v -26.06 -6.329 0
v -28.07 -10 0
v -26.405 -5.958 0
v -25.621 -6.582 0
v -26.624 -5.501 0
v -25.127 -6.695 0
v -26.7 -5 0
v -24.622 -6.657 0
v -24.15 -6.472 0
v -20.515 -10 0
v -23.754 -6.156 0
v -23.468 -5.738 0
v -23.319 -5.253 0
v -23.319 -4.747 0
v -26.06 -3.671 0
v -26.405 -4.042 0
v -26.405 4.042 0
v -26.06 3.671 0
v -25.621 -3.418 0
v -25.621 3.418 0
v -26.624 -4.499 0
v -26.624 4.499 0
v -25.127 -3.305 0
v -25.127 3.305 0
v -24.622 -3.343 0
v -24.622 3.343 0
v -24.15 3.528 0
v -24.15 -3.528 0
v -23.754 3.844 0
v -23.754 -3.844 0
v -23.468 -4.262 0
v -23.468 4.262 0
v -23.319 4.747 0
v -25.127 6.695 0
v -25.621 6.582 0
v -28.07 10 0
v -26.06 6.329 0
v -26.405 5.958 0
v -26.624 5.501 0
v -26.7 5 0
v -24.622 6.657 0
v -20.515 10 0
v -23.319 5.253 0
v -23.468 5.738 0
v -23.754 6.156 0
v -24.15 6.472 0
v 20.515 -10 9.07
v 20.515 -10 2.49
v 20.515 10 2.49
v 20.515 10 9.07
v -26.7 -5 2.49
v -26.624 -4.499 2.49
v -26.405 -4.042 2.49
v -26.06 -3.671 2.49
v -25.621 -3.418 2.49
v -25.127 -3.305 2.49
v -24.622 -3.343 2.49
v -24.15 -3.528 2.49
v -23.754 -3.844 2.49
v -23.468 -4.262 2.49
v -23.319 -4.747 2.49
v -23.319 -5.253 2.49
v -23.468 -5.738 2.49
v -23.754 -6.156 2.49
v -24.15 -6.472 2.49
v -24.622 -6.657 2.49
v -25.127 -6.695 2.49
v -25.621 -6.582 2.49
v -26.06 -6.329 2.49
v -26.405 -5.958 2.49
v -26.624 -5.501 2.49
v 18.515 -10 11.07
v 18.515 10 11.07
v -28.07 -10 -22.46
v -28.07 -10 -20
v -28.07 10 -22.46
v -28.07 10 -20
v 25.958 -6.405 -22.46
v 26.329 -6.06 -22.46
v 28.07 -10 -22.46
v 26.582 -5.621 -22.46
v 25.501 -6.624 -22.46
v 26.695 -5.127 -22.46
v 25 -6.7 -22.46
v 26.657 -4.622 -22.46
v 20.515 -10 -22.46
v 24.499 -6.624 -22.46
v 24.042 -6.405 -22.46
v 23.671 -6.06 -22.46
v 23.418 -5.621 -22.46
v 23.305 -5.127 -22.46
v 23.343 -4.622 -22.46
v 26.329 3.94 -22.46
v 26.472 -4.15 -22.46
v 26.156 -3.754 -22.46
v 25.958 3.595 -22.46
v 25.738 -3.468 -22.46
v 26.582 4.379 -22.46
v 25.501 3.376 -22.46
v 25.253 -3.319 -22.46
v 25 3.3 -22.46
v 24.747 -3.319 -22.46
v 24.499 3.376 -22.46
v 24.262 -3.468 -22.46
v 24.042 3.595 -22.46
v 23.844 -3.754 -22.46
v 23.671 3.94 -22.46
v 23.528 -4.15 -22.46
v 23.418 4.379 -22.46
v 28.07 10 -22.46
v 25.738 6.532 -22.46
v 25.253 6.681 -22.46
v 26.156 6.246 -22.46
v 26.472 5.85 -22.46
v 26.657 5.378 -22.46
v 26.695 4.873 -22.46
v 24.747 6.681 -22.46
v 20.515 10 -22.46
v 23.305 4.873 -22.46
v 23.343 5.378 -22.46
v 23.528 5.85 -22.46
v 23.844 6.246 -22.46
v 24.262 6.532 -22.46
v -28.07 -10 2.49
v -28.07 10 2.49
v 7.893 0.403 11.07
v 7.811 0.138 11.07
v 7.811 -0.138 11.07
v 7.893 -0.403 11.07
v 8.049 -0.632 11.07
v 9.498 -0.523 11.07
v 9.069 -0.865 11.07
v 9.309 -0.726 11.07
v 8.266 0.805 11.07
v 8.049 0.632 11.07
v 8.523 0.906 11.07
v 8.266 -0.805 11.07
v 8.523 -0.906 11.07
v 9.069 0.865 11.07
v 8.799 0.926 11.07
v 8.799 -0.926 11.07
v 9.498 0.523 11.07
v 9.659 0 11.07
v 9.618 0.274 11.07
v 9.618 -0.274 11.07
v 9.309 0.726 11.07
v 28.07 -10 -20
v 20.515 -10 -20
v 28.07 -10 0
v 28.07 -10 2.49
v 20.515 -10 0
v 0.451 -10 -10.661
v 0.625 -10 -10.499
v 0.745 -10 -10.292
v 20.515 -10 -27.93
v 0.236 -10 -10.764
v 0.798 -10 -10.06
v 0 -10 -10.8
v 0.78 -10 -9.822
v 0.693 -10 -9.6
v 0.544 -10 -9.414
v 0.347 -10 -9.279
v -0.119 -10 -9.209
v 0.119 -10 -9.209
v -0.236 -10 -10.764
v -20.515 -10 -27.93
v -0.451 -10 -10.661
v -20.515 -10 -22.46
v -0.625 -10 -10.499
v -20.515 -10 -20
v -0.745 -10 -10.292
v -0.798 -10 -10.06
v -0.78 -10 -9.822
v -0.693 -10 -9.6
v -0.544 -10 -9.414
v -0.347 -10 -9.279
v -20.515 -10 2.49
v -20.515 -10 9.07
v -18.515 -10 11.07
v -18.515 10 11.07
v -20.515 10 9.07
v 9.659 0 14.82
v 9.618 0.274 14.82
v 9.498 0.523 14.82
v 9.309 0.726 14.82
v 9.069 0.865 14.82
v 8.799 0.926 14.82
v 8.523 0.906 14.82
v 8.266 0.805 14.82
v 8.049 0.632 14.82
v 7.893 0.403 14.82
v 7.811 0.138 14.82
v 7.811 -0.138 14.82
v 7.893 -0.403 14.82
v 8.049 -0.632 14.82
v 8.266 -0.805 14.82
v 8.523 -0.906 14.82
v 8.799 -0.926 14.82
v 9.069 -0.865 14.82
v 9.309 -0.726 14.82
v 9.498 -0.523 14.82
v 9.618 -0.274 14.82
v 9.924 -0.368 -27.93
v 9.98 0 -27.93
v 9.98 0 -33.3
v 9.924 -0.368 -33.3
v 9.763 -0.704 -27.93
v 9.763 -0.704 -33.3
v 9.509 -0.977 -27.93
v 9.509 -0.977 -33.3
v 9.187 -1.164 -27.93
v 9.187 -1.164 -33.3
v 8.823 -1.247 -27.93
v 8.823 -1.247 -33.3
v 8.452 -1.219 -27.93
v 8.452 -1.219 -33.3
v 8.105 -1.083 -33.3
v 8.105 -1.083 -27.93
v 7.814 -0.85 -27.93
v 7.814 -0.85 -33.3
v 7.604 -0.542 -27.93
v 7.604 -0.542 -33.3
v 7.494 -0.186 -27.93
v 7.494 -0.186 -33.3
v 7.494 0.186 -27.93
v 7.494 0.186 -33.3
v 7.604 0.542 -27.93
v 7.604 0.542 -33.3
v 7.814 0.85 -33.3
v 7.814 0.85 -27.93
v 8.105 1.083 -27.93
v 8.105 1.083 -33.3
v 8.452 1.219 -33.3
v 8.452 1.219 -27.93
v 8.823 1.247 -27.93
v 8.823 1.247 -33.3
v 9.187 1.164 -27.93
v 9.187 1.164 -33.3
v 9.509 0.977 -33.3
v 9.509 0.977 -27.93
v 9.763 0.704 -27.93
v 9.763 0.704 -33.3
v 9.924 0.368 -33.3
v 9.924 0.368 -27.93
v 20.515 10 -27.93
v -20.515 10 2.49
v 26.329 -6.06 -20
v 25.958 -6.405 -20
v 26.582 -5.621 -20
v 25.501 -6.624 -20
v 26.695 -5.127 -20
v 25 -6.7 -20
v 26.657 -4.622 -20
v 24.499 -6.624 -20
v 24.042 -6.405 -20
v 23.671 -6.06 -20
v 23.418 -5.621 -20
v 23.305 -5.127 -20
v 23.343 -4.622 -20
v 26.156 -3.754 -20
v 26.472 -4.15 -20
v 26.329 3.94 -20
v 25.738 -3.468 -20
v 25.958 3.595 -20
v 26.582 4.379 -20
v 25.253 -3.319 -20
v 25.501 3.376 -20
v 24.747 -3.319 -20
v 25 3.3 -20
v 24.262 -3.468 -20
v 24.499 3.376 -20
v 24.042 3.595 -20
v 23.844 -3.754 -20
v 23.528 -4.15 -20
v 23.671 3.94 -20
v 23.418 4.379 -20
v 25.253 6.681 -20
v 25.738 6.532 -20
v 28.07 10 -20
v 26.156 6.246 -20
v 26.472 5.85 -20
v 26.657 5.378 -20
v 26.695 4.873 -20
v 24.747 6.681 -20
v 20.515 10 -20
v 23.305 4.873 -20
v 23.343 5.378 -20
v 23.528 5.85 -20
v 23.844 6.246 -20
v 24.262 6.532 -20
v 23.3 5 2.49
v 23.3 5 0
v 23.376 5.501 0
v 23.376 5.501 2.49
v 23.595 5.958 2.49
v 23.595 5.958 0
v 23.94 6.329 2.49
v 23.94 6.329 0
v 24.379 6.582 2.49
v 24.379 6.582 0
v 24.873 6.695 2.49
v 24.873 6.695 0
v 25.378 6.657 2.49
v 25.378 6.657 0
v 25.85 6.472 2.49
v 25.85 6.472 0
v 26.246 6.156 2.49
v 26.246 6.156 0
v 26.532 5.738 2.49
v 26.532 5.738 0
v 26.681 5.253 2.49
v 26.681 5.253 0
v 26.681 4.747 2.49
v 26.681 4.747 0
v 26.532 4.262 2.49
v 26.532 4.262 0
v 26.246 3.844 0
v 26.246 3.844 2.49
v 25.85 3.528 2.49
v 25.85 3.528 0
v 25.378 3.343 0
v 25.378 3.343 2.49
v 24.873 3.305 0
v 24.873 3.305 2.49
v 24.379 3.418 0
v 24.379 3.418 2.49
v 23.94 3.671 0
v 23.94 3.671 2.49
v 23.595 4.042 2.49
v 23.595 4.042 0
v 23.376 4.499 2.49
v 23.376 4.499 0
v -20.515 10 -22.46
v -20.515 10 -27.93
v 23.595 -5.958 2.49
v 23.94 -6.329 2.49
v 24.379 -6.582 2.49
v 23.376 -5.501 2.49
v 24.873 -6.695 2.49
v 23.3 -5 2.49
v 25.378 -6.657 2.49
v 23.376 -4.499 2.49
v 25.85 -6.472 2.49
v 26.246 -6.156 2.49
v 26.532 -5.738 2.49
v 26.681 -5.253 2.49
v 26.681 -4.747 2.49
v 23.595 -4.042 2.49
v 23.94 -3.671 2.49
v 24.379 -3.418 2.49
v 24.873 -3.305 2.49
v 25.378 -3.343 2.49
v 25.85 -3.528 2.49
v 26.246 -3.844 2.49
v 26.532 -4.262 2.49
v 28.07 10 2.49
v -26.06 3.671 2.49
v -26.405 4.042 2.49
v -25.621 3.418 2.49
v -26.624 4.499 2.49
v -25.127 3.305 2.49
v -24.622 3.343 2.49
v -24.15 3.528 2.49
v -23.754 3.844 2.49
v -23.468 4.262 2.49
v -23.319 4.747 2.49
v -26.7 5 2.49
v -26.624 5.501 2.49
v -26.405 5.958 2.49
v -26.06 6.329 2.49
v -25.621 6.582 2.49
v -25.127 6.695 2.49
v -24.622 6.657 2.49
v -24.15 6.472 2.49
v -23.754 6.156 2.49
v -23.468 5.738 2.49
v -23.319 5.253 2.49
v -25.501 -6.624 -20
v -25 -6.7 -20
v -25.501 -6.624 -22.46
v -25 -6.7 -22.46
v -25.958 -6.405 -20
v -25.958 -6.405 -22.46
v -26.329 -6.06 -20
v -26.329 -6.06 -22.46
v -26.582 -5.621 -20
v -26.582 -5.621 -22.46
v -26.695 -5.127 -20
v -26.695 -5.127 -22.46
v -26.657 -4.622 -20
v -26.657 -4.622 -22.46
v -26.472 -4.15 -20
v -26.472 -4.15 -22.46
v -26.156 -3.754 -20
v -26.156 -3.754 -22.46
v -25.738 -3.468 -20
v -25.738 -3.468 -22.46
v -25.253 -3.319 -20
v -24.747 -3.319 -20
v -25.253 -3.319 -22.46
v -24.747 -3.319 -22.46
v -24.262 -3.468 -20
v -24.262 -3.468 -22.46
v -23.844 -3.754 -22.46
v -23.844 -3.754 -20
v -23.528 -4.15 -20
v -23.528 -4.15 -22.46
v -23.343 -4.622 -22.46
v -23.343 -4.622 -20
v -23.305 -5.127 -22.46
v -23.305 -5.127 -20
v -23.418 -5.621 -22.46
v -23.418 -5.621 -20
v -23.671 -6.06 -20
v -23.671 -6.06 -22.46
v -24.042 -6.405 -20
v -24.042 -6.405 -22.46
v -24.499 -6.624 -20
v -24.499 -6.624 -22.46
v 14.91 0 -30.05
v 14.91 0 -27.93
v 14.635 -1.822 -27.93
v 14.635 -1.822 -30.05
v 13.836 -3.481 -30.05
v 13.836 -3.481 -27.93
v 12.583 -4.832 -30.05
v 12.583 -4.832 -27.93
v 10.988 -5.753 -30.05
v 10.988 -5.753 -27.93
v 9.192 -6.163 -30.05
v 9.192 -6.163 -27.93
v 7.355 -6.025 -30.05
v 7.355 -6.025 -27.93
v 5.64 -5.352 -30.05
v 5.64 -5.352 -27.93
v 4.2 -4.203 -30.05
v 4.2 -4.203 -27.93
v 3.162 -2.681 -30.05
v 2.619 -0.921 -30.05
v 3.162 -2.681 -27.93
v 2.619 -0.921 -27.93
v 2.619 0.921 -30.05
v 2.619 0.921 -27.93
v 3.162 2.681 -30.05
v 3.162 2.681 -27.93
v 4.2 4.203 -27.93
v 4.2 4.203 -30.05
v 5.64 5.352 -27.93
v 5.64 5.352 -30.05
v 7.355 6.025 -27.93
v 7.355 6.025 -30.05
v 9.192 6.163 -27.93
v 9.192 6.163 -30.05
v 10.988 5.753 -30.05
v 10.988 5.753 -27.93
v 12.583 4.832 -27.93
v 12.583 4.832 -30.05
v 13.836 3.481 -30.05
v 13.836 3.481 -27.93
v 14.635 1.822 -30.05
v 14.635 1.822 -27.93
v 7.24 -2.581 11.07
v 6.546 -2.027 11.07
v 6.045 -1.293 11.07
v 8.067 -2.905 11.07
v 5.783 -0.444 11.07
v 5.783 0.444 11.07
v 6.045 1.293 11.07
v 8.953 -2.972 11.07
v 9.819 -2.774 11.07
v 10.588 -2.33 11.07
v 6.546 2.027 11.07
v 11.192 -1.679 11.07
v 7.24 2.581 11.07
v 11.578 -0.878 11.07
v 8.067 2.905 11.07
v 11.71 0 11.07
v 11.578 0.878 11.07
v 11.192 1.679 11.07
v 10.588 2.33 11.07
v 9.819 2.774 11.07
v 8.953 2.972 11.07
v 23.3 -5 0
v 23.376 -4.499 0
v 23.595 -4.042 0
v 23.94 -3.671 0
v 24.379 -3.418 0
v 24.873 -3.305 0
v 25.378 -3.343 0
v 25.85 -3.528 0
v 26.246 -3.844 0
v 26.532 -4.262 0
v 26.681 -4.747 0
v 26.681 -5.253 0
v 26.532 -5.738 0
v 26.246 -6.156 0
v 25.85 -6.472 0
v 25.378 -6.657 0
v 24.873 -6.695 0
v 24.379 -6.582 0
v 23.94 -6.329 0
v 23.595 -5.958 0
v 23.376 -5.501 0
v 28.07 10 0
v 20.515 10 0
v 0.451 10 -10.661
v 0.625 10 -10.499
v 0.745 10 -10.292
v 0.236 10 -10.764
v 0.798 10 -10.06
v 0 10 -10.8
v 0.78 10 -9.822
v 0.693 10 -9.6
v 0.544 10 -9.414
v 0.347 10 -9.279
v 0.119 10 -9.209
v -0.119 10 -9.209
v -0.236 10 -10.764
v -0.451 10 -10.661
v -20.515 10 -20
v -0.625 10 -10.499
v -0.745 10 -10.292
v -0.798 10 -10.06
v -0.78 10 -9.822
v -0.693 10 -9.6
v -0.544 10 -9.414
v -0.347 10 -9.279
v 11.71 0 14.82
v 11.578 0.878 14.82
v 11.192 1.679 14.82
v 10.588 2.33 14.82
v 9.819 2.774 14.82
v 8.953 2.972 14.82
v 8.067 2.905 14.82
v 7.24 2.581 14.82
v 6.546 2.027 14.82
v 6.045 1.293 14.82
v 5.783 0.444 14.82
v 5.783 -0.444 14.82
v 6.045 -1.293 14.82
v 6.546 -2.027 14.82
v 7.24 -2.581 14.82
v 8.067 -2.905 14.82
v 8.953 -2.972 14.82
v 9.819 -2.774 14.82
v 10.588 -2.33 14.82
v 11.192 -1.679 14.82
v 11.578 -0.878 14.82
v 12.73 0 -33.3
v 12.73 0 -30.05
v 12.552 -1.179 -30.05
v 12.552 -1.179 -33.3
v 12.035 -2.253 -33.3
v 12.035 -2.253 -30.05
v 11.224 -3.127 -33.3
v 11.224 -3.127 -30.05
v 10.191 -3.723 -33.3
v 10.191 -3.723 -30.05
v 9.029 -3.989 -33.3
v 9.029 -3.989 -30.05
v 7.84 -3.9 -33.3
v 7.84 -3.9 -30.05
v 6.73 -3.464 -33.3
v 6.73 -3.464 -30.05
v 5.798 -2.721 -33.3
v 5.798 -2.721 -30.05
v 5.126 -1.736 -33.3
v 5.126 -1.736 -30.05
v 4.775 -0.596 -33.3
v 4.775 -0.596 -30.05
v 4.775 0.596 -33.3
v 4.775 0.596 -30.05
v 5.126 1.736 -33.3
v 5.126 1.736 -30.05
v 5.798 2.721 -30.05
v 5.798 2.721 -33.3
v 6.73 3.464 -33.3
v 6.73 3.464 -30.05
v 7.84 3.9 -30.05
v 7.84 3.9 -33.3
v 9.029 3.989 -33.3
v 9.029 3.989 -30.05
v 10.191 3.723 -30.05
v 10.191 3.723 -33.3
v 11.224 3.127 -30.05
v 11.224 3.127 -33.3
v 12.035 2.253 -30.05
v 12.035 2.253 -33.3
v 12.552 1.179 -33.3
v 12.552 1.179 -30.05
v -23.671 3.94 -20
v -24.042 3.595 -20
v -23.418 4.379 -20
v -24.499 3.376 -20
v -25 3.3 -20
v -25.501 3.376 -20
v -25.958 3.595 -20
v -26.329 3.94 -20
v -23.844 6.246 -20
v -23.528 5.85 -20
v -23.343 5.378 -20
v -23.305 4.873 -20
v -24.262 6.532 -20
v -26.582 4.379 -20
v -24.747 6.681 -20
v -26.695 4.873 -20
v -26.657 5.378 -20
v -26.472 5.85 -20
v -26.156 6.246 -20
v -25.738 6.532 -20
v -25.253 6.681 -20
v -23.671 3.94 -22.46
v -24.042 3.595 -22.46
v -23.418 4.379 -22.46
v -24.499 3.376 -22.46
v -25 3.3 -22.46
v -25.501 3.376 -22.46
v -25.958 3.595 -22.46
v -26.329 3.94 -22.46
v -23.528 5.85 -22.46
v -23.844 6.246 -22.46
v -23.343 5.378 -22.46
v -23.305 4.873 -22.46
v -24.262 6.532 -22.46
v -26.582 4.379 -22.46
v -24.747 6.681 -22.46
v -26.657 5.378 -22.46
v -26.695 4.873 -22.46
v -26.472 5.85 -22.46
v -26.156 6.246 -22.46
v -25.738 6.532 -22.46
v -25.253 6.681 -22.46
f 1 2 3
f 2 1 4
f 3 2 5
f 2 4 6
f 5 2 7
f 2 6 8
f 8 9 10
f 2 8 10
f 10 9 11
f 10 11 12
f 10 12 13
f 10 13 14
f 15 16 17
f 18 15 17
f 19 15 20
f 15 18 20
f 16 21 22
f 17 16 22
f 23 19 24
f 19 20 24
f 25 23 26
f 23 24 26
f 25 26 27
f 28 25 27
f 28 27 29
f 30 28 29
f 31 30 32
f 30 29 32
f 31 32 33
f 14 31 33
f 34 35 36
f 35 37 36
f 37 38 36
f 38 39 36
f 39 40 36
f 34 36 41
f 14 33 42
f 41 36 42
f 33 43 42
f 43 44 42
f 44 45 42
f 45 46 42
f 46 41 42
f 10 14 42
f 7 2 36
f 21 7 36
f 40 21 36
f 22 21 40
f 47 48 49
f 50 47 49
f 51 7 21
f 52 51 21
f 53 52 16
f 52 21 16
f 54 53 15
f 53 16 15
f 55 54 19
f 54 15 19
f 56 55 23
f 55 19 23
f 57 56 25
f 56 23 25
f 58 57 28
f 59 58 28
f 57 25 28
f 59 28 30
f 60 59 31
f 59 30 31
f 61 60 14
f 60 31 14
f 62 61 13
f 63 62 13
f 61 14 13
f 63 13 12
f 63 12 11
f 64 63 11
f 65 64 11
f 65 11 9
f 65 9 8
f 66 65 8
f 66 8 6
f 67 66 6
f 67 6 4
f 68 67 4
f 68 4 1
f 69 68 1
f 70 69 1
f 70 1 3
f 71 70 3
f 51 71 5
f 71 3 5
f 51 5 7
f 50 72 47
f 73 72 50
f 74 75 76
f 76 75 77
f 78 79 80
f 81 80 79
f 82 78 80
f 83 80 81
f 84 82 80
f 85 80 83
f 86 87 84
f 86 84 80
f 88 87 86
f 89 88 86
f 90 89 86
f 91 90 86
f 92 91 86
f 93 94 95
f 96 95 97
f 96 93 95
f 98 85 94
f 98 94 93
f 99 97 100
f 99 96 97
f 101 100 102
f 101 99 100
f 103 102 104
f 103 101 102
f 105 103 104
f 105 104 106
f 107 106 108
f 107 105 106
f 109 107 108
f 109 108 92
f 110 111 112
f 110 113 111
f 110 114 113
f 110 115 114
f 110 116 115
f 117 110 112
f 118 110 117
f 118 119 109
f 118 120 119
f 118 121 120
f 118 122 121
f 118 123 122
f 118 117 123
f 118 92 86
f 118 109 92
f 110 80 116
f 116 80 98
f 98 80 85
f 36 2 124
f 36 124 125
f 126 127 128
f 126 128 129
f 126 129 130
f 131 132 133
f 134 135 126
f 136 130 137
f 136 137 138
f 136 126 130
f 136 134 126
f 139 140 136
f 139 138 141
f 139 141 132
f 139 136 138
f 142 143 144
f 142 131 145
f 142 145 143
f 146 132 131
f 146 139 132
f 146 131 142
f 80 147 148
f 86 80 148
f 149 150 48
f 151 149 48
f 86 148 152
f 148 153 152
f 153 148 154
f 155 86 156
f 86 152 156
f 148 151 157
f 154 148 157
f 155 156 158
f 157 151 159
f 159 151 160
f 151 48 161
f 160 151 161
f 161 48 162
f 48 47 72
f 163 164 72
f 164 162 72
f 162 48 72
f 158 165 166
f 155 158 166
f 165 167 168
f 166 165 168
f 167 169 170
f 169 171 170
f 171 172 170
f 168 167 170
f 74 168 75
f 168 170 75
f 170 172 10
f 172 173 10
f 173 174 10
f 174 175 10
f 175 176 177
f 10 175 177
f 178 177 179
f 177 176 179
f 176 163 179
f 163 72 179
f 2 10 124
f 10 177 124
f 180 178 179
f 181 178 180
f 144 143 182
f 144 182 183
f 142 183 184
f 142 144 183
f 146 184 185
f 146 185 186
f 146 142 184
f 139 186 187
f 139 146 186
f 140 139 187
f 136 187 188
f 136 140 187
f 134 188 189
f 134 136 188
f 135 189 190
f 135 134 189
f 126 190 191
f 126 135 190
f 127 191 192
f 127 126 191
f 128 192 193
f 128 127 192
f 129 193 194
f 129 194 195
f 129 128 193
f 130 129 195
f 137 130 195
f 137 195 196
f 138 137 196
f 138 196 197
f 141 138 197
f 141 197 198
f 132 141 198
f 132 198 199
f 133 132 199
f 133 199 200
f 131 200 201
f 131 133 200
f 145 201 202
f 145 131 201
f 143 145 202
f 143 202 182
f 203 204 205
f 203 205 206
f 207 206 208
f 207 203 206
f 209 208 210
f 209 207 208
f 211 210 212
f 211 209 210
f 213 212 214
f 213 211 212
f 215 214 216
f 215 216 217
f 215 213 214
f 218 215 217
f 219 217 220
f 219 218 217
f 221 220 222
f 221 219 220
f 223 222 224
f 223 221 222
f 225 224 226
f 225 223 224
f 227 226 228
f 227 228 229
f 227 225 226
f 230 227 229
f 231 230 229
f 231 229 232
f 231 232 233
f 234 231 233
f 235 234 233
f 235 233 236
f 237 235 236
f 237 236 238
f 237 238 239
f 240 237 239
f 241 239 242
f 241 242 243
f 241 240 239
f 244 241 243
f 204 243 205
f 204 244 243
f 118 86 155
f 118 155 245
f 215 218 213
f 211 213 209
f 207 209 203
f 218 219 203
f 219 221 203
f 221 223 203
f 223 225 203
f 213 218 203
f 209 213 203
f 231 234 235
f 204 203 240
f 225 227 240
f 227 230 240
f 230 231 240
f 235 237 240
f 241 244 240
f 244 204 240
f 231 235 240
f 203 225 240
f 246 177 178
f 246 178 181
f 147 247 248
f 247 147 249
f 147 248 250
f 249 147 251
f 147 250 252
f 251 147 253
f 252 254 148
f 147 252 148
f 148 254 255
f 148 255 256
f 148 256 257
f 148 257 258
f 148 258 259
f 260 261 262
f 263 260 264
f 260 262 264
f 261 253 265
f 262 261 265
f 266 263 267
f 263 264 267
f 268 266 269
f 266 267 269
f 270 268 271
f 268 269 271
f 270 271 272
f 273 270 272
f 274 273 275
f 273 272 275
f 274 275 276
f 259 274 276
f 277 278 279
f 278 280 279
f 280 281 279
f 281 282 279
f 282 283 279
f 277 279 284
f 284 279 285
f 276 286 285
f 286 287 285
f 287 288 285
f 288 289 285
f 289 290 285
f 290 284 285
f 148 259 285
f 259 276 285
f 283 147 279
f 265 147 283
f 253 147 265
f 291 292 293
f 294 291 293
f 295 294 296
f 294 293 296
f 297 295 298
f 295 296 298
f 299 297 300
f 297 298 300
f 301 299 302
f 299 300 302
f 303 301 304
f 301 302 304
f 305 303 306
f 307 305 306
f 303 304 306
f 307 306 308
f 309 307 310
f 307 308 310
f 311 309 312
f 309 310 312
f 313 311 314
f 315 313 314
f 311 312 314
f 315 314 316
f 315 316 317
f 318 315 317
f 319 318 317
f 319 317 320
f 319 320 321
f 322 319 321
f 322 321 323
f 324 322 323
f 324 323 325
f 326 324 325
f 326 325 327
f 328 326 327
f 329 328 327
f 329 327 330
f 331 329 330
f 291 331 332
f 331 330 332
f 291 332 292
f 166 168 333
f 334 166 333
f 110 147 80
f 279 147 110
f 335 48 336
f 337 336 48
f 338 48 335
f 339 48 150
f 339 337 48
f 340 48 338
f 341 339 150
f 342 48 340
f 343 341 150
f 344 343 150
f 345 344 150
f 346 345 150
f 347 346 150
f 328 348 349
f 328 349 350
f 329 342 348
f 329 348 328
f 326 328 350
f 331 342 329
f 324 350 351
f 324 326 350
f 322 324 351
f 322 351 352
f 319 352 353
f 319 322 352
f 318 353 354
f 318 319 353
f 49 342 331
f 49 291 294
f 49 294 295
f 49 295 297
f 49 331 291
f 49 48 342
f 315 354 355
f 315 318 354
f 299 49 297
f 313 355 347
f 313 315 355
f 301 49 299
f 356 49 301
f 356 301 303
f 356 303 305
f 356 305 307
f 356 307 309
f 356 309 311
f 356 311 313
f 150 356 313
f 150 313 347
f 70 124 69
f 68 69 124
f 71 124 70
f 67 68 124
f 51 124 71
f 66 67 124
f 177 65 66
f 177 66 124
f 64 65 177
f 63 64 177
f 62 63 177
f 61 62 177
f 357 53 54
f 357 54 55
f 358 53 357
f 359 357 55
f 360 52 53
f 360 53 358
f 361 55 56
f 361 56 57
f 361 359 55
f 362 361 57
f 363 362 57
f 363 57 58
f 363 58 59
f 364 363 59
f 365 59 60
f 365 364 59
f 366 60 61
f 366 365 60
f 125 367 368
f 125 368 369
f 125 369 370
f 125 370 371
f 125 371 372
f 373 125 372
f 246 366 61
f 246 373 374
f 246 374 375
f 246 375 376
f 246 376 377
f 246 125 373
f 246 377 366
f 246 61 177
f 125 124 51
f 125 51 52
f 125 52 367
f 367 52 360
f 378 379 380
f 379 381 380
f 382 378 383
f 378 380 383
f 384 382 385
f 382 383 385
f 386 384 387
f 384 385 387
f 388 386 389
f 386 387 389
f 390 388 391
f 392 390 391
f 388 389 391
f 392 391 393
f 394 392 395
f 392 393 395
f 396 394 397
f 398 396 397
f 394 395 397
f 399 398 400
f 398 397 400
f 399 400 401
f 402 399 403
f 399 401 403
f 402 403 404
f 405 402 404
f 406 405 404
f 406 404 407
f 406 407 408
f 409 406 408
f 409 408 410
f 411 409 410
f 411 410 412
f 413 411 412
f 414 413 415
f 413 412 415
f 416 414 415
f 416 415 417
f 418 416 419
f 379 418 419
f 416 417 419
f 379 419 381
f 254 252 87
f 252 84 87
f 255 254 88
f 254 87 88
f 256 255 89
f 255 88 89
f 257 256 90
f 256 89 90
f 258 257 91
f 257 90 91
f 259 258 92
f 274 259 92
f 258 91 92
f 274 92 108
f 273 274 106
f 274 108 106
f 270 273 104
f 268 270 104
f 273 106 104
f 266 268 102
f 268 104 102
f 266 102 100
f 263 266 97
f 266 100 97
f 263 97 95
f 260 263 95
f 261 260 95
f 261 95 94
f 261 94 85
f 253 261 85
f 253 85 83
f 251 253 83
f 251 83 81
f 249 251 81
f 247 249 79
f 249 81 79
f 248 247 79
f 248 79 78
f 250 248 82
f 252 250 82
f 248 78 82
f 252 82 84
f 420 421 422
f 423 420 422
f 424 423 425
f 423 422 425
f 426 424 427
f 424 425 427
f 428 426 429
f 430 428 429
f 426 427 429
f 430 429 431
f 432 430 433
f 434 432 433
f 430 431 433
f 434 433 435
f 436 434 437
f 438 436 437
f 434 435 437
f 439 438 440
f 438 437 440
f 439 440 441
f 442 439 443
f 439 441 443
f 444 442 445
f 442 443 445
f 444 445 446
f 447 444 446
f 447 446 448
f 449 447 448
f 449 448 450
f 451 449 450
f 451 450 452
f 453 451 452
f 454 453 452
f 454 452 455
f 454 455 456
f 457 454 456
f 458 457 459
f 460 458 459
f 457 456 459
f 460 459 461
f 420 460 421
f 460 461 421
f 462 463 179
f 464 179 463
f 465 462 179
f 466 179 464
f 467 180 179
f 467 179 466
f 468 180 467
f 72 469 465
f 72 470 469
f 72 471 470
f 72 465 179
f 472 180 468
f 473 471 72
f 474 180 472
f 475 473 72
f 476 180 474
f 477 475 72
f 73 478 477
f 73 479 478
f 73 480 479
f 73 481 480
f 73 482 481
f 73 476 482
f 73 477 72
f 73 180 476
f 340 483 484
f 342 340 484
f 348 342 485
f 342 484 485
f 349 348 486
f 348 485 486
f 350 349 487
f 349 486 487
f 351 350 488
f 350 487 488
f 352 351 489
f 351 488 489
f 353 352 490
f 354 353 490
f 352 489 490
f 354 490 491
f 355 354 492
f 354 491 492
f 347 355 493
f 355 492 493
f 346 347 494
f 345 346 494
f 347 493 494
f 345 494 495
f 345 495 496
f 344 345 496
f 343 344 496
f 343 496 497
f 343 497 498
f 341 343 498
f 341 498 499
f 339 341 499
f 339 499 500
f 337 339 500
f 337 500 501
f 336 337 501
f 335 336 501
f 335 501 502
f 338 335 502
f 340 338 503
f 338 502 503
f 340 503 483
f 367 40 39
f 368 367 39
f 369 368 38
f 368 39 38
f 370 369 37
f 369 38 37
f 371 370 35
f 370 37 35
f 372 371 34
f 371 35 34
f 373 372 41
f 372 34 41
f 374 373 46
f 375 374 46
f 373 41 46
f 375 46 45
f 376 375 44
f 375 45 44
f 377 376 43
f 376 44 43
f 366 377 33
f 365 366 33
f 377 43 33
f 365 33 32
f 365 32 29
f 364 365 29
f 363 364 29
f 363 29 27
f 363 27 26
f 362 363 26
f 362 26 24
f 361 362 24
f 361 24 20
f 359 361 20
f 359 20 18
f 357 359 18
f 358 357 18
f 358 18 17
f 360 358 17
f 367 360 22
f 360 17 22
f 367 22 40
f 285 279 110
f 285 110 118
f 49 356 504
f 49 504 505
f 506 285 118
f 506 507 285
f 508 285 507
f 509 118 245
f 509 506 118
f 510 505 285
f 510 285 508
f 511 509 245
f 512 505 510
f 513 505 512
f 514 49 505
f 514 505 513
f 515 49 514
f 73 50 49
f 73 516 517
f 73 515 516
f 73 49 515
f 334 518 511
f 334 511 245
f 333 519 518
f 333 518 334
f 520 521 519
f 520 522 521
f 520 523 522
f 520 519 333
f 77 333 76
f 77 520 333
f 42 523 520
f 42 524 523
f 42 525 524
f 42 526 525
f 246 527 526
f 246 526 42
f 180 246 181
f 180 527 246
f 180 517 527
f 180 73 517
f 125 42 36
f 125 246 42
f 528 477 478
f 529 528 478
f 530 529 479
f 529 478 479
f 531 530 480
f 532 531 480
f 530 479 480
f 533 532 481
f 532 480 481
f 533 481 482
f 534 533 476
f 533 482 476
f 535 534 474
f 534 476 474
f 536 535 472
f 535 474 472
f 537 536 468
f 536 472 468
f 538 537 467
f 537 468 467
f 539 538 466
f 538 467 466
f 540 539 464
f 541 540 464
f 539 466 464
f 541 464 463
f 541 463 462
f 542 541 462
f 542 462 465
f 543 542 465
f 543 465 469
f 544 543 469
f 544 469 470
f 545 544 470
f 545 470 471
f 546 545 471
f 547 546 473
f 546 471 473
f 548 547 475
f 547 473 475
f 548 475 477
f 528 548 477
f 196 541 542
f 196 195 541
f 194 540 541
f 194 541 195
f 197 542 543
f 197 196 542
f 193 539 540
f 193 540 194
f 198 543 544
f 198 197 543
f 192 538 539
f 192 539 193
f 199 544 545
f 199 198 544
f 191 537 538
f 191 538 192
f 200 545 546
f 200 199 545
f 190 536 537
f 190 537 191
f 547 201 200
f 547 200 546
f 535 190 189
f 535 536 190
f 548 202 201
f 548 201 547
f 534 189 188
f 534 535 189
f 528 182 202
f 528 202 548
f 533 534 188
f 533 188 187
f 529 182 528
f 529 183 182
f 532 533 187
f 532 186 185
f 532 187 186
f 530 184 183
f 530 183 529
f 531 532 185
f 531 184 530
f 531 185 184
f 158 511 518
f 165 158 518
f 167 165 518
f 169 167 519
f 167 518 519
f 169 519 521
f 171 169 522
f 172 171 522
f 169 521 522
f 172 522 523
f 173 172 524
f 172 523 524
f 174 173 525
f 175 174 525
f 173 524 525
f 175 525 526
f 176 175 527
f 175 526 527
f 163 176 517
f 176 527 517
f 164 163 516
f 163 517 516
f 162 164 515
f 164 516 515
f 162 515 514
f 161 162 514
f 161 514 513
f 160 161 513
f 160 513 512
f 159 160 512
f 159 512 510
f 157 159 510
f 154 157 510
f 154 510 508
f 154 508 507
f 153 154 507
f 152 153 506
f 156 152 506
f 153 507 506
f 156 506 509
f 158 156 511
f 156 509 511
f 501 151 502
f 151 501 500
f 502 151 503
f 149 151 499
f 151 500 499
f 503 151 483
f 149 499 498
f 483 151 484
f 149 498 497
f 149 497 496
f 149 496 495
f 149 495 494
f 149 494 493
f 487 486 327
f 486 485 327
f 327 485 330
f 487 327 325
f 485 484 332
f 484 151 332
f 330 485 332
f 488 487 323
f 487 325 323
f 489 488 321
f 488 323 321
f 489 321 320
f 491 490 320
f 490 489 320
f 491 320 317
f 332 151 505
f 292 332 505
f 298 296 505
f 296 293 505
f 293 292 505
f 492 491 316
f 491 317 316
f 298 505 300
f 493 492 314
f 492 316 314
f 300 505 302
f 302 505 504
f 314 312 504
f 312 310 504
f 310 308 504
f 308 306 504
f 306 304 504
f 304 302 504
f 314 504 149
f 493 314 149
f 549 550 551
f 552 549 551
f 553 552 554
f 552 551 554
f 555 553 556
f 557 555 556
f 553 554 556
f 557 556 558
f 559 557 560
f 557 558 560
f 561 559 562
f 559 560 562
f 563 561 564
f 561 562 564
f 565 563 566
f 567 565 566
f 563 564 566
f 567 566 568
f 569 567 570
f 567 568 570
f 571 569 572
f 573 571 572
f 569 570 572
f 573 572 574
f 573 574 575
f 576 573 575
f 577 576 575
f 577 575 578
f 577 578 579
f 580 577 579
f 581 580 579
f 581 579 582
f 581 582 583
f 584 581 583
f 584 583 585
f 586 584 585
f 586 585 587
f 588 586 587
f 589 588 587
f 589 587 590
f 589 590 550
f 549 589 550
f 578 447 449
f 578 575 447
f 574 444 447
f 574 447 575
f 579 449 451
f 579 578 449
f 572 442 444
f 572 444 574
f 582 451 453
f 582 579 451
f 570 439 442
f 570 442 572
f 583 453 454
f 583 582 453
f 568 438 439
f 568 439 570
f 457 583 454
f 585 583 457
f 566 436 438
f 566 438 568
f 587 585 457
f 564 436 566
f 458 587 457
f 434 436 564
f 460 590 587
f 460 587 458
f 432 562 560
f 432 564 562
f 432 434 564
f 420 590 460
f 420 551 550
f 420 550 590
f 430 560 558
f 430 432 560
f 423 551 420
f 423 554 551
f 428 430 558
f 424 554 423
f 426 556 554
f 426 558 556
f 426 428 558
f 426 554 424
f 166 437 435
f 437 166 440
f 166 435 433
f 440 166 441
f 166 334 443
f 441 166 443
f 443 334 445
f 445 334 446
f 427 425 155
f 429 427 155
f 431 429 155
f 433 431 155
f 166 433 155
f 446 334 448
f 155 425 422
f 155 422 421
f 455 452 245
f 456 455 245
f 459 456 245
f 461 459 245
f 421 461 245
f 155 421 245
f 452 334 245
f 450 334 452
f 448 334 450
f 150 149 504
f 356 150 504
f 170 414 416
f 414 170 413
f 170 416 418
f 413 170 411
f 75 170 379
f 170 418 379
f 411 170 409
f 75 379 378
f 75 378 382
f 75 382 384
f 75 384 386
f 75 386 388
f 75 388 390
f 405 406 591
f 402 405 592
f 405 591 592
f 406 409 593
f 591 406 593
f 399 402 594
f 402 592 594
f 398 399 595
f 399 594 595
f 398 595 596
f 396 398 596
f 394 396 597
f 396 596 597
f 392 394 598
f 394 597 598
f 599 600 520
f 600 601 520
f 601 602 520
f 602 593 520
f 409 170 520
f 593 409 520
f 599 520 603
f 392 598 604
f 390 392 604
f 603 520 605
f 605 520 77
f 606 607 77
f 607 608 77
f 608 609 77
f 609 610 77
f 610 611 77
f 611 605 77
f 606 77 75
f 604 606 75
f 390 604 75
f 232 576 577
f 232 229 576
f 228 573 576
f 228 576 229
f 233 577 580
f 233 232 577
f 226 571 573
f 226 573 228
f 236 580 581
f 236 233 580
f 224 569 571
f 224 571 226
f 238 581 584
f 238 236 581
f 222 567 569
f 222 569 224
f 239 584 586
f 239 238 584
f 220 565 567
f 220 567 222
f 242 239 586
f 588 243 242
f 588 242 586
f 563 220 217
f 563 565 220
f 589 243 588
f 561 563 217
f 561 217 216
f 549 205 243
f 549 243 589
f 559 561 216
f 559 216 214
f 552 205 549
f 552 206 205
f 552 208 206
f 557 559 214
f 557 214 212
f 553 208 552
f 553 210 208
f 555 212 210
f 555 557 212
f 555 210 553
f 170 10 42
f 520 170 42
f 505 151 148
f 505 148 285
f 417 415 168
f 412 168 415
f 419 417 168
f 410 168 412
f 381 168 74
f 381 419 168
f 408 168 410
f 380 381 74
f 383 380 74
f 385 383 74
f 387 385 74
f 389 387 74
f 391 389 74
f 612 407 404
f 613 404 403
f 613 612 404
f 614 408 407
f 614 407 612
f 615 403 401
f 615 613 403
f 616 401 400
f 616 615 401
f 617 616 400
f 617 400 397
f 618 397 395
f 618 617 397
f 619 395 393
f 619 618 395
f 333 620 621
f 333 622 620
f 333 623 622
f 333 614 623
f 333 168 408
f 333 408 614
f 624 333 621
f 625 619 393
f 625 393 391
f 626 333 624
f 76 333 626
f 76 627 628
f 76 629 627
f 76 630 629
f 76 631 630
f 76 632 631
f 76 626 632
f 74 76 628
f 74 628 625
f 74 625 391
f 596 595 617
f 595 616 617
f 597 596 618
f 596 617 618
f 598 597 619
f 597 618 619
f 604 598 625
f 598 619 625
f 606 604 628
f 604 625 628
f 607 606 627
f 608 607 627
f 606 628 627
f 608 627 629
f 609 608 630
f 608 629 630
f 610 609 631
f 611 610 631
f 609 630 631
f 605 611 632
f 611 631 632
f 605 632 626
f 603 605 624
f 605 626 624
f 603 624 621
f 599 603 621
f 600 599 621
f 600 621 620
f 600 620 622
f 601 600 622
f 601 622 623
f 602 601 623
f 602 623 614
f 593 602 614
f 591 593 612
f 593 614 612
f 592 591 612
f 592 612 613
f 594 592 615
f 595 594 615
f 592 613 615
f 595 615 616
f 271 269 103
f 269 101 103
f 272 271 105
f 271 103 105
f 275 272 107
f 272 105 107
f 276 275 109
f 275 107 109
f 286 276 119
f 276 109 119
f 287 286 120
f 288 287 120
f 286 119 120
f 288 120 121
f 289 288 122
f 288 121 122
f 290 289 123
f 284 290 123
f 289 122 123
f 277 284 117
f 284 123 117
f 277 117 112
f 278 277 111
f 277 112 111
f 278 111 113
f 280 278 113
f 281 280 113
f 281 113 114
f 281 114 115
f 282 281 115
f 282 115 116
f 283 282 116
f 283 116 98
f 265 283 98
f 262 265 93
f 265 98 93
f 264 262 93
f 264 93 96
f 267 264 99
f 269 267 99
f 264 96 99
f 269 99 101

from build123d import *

# Parameters (mm, degrees)
SKETCH1_W                        = 56.14
SKETCH1_H                        = 20
BOSS_EXTRUDE1_DEPTH              = 2.49
M3_CLEARANCE_HOLE1_D             = 3.4
M3_CLEARANCE_HOLE1_DEPTH         = 19
M3_CLEARANCE_HOLE1_TIP           = 1.021463052
SKETCH4_W                        = 41.03
SKETCH4_H                        = 20
BOSS_EXTRUDE2_DEPTH              = 8.58
SKETCH5_R                        = 2.98
SKETCH5_R_2                      = 0.928997072
BOSS_EXTRUDE3_DEPTH              = 3.75
SKETCH6_W                        = 8
SKETCH6_H                        = 20
BOSS_EXTRUDE4_DEPTH              = 20
BOSS_EXTRUDE4_2_DEPTH            = 20
SKETCH7_W                        = 41.03
SKETCH7_H                        = 20
BOSS_EXTRUDE5_DEPTH              = 20
SKETCH8_W                        = 56.14
SKETCH8_H                        = 20
BOSS_EXTRUDE6_DEPTH              = 2.46
SKETCH12_W                       = 1.7
SKETCH12_H                       = 24.95
M3_CLEARANCE_HOLE2_AT_2_COUNT    = 2
M3_CLEARANCE_HOLE2_AT_2_PITCH    = 10
M3_CLEARANCE_HOLE2_AT_3_COUNT    = 2
M3_CLEARANCE_HOLE2_AT_3_PITCH    = 50
M3_CLEARANCE_HOLE2_AT_4_COUNT    = 2
M3_CLEARANCE_HOLE2_AT_4_PITCH    = 50.990195136
SKETCH13_W                       = 41.03
SKETCH13_H                       = 20
BOSS_EXTRUDE7_DEPTH              = 39
SKETCH14_R                       = 4
SKETCH14_R_2                     = 1.25
BOSS_EXTRUDE8_DEPTH              = 5.37
SKETCH16_W                       = 0.8
SKETCH16_H                       = 20.00005
TAP_DRILL_FOR_M2_TAP1_AT_2_COUNT = 2
TAP_DRILL_FOR_M2_TAP1_AT_2_PITCH = 25.495097568
TAP_DRILL_FOR_M2_TAP1_AT_3_COUNT = 2
TAP_DRILL_FOR_M2_TAP1_AT_3_PITCH = 10
TAP_DRILL_FOR_M2_TAP1_AT_4_COUNT = 2
TAP_DRILL_FOR_M2_TAP1_AT_4_PITCH = 50
TAP_DRILL_FOR_M2_TAP1_AT_5_COUNT = 2
TAP_DRILL_FOR_M2_TAP1_AT_5_PITCH = 50.990195136
CHAMFER1_SIZE                    = 2
SKETCH19_R                       = 6.18
SKETCH19_R_2                     = 4
BOSS_EXTRUDE10_DEPTH             = 2.12
SKETCH21_W                       = 8
SKETCH21_H                       = 7
CUT_EXTRUDE1_DEPTH               = 28
SKETCH22_W                       = 20
SKETCH22_H                       = 20
CUT_EXTRUDE2_DEPTH               = 8.235
SKETCH23_W                       = 20
SKETCH23_H                       = 20
CUT_EXTRUDE3_DEPTH               = 8.235


with BuildPart() as part:
    # Sketch1 → Boss-Extrude1 (new body)
    with BuildSketch(Plane.XY):
        Rectangle(SKETCH1_W, SKETCH1_H)
    extrude(amount=BOSS_EXTRUDE1_DEPTH)

    # M3 Clearance Hole1
    with Locations(Plane.XY.offset(2.49)):
        with Locations((25, 5), (0, 0), (-25, 5), (-25, -5), (25, -5)):
            Hole(M3_CLEARANCE_HOLE1_D / 2, depth=M3_CLEARANCE_HOLE1_DEPTH)
            with Locations((0, 0, -(M3_CLEARANCE_HOLE1_DEPTH + M3_CLEARANCE_HOLE1_TIP / 2))):  # 118° drill point
                Cone(0, M3_CLEARANCE_HOLE1_D / 2, M3_CLEARANCE_HOLE1_TIP, mode=Mode.SUBTRACT)

    # Sketch4 → Boss-Extrude2 (add)
    with BuildSketch(Plane.XY.offset(2.49)):
        Rectangle(SKETCH4_W, SKETCH4_H)
    extrude(amount=BOSS_EXTRUDE2_DEPTH)

    # Sketch5 → Boss-Extrude3 (add)
    with BuildSketch(Plane.XY.offset(11.07)):
        with Locations((8.73, 0)):
            Circle(SKETCH5_R)
        with Locations((8.73, 0)):
            Circle(SKETCH5_R_2, mode=Mode.SUBTRACT)
    extrude(amount=BOSS_EXTRUDE3_DEPTH)

    # Sketch7 → Boss-Extrude5 (add)
    with BuildSketch(Plane(origin=(0, 0, 0), x_dir=(-1, 0, 0), z_dir=(0, 0, -1))):
        Rectangle(SKETCH7_W, SKETCH7_H)
    extrude(amount=BOSS_EXTRUDE5_DEPTH)

    # Sketch8 → Boss-Extrude6 (add)
    with BuildSketch(Plane(origin=(0, 0, -20), x_dir=(-1, 0, 0), z_dir=(0, 0, -1))):
        Rectangle(SKETCH8_W, SKETCH8_H)
    extrude(amount=BOSS_EXTRUDE6_DEPTH)


with BuildPart() as body_2:
    # Sketch6 → Boss-Extrude4 (new body)
    with BuildSketch(Plane(origin=(0, 0, 0), x_dir=(-1, 0, 0), z_dir=(0, 0, -1))):
        with Locations((-24.75, 0)):
            Rectangle(SKETCH6_W, SKETCH6_H)
    extrude(amount=BOSS_EXTRUDE4_DEPTH)


with BuildPart() as body_3:
    # Sketch6 → Boss-Extrude4 2 (new body)
    with BuildSketch(Plane(origin=(0, 0, 0), x_dir=(-1, 0, 0), z_dir=(0, 0, -1))):
        with Locations((24.75, 0)):
            Rectangle(SKETCH6_W, SKETCH6_H)
    extrude(amount=BOSS_EXTRUDE4_2_DEPTH)


with BuildPart() as m3_clearance_hole2_tool:
    # Sketch12 → M3 Clearance Hole2 (revolve)
    with BuildSketch(Plane(origin=(25, 5, 2.49), x_dir=(0, -1, 0), z_dir=(1, 0, 0))):
        with Locations((0.85, 12.475)):
            Rectangle(SKETCH12_W, SKETCH12_H)
    m3_clearance_hole2 = revolve(axis=Axis((25, 5, 8.84), (0, 0, -1)))


with BuildPart() as part_1:
    add(part.part)

    # M3 Clearance Hole2: cut by m3_clearance_hole2_tool
    add(m3_clearance_hole2_tool.part, mode=Mode.SUBTRACT)


with BuildPart() as body_2_1:
    add(body_2.part)

    # M3 Clearance Hole2: cut by m3_clearance_hole2_tool
    add(m3_clearance_hole2_tool.part, mode=Mode.SUBTRACT)


with BuildPart() as m3_clearance_hole2_at_2_tool:
    # M3 Clearance Hole2 at 2: M3 Clearance Hole2 ×2
    with Locations(*[(0, -i * M3_CLEARANCE_HOLE2_AT_2_PITCH, 0) for i in range(1, M3_CLEARANCE_HOLE2_AT_2_COUNT)]):
        add(m3_clearance_hole2)


with BuildPart() as part_2:
    add(part_1.part)

    # M3 Clearance Hole2 at 2: cut by m3_clearance_hole2_at_2_tool
    add(m3_clearance_hole2_at_2_tool.part, mode=Mode.SUBTRACT)


with BuildPart() as body_2_2:
    add(body_2_1.part)

    # M3 Clearance Hole2 at 2: cut by m3_clearance_hole2_at_2_tool
    add(m3_clearance_hole2_at_2_tool.part, mode=Mode.SUBTRACT)


with BuildPart() as m3_clearance_hole2_at_3_tool:
    # M3 Clearance Hole2 at 3: M3 Clearance Hole2 ×2
    with Locations(*[(-i * M3_CLEARANCE_HOLE2_AT_3_PITCH, 0, 0) for i in range(1, M3_CLEARANCE_HOLE2_AT_3_COUNT)]):
        add(m3_clearance_hole2)


with BuildPart() as part_3:
    add(part_2.part)

    # M3 Clearance Hole2 at 3: cut by m3_clearance_hole2_at_3_tool
    add(m3_clearance_hole2_at_3_tool.part, mode=Mode.SUBTRACT)


with BuildPart() as body_3_1:
    add(body_3.part)

    # M3 Clearance Hole2 at 3: cut by m3_clearance_hole2_at_3_tool
    add(m3_clearance_hole2_at_3_tool.part, mode=Mode.SUBTRACT)


with BuildPart() as m3_clearance_hole2_at_4_tool:
    # M3 Clearance Hole2 at 4: M3 Clearance Hole2 ×2
    with Locations(*[Vector(-0.9805806756909201, -0.19611613513818418, 0) * (i * M3_CLEARANCE_HOLE2_AT_4_PITCH) for i in range(1, M3_CLEARANCE_HOLE2_AT_4_COUNT)]):
        add(m3_clearance_hole2)


with BuildPart() as part_4:
    add(part_3.part)

    # M3 Clearance Hole2 at 4: cut by m3_clearance_hole2_at_4_tool
    add(m3_clearance_hole2_at_4_tool.part, mode=Mode.SUBTRACT)

    # Sketch13 → Boss-Extrude7 (add)
    with BuildSketch(Plane.XY.offset(11.07)):
        Rectangle(SKETCH13_W, SKETCH13_H)
    extrude(amount=-BOSS_EXTRUDE7_DEPTH)

    # Sketch14 → Boss-Extrude8 (add)
    with BuildSketch(Plane(origin=(0, 0, -27.93), x_dir=(-1, 0, 0), z_dir=(0, 0, -1))):
        with Locations(Location((-8.73, 0, 0), (0, 0, 180))):
            Circle(SKETCH14_R)
        with Locations(Location((-8.73, 0, 0), (0, 0, 180))):
            Circle(SKETCH14_R_2, mode=Mode.SUBTRACT)
    extrude(amount=BOSS_EXTRUDE8_DEPTH)


with BuildPart() as body_3_2:
    add(body_3_1.part)

    # M3 Clearance Hole2 at 4: cut by m3_clearance_hole2_at_4_tool
    add(m3_clearance_hole2_at_4_tool.part, mode=Mode.SUBTRACT)

    # Sketch16 → Tap Drill for M2 Tap1 (revolve, cut)
    with BuildSketch(Plane(origin=(-25, -10, -5), x_dir=(0, 0, -1), z_dir=(1, 0, 0))):
        with Locations((0.4, 10.000025)):
            Rectangle(SKETCH16_W, SKETCH16_H)
    tap_drill_for_m2_tap1 = revolve(axis=Axis((-25, -16.35, -5), (0, 1, 0)), mode=Mode.SUBTRACT)

    # Tap Drill for M2 Tap1 at 3: Tap Drill for M2 Tap1 ×2
    with Locations(*[(0, 0, -i * TAP_DRILL_FOR_M2_TAP1_AT_3_PITCH) for i in range(1, TAP_DRILL_FOR_M2_TAP1_AT_3_COUNT)]):
        add(tap_drill_for_m2_tap1, mode=Mode.SUBTRACT)


with BuildPart() as part_5:
    add(part_4.part)

    # Tap Drill for M2 Tap1 at 2: Tap Drill for M2 Tap1 ×2
    with Locations(*[Vector(0.9805806756909201, 0, -0.1961161351381842) * (i * TAP_DRILL_FOR_M2_TAP1_AT_2_PITCH) for i in range(1, TAP_DRILL_FOR_M2_TAP1_AT_2_COUNT)]):
        add(tap_drill_for_m2_tap1, mode=Mode.SUBTRACT)

    # Chamfer1
    chamfer1_edges = [part_5.edges().sort_by_distance(p)[0] for p in [
        (-20.515, 0, 11.07),
        (20.515, 0, 11.07),
    ]]
    chamfer(chamfer1_edges, length=CHAMFER1_SIZE)

    # Sketch19 → Boss-Extrude10 (add)
    with BuildSketch(Plane(origin=(0, 0, -27.93), x_dir=(-1, 0, 0), z_dir=(0, 0, -1))):
        with Locations(Location((-8.73, 0, 0), (0, 0, 180))):
            Circle(SKETCH19_R)
        with Locations(Location((-8.73, 0, 0), (0, 0, 180))):
            Circle(SKETCH19_R_2, mode=Mode.SUBTRACT)
    extrude(amount=BOSS_EXTRUDE10_DEPTH)


with BuildPart() as body_2_3:
    add(body_2_2.part)

    # Tap Drill for M2 Tap1 at 4: Tap Drill for M2 Tap1 ×2
    with Locations(*[(i * TAP_DRILL_FOR_M2_TAP1_AT_4_PITCH, 0, 0) for i in range(1, TAP_DRILL_FOR_M2_TAP1_AT_4_COUNT)]):
        add(tap_drill_for_m2_tap1, mode=Mode.SUBTRACT)

    # Tap Drill for M2 Tap1 at 5: Tap Drill for M2 Tap1 ×2
    with Locations(*[Vector(0.9805806756909202, 0, -0.19611613513818407) * (i * TAP_DRILL_FOR_M2_TAP1_AT_5_PITCH) for i in range(1, TAP_DRILL_FOR_M2_TAP1_AT_5_COUNT)]):
        add(tap_drill_for_m2_tap1, mode=Mode.SUBTRACT)


with BuildPart() as cut_extrude1_tool:
    # Sketch21 → Cut-Extrude1 (new body)
    with BuildSketch(Plane(origin=(0, 10, 0), x_dir=(1, 0, 0), z_dir=(0, 1, 0))):
        with Locations((-24.75, 10)):
            Rectangle(SKETCH21_W, SKETCH21_H)
        with Locations((24.75, 10)):
            Rectangle(SKETCH21_W, SKETCH21_H)
    extrude(amount=-CUT_EXTRUDE1_DEPTH)


with BuildPart() as body_2_4:
    add(body_2_3.part)

    # Cut-Extrude1: cut by cut_extrude1_tool
    add(cut_extrude1_tool.part, mode=Mode.SUBTRACT)


with BuildPart() as body_3_3:
    add(body_3_2.part)

    # Cut-Extrude1: cut by cut_extrude1_tool
    add(cut_extrude1_tool.part, mode=Mode.SUBTRACT)


with BuildPart() as cut_extrude1_piece_1:
    # of the separate pieces the step leaves, piece 1, a body of its own (cut_extrude1_pieces)
    add(body_2_4.part.solids().sort_by_distance((20.75, 10, 0))[0])


with BuildPart() as cut_extrude1_piece_2:
    # of the separate pieces the step leaves, piece 2, a body of its own (cut_extrude1_pieces)
    add(body_2_4.part.solids().sort_by_distance((20.75, 10, -13.5))[0])


with BuildPart() as cut_extrude1_piece_1_of_body_3:
    # of the separate pieces the step leaves, piece 1, a body of its own (cut_extrude1_pieces_of_body_3)
    add(body_3_3.part.solids().sort_by_distance((-28.75, 10, 0))[0])


with BuildPart() as cut_extrude1_piece_2_of_body_3:
    # of the separate pieces the step leaves, piece 2, a body of its own (cut_extrude1_pieces_of_body_3)
    add(body_3_3.part.solids().sort_by_distance((-28.75, 10, -13.5))[0])


with BuildPart() as cut_extrude2_tool:
    # Sketch22 → Cut-Extrude2 (new body)
    with BuildSketch(Plane.ZY.offset(28.75)):
        with Locations((-10, 0)):
            Rectangle(SKETCH22_W, SKETCH22_H)
    extrude(amount=-CUT_EXTRUDE2_DEPTH)


with BuildPart() as cut_extrude1_piece_1_of_body_3_1:
    add(cut_extrude1_piece_1_of_body_3.part)

    # Cut-Extrude2: cut by cut_extrude2_tool
    add(cut_extrude2_tool.part, mode=Mode.SUBTRACT)


with BuildPart() as cut_extrude1_piece_2_of_body_3_1:
    add(cut_extrude1_piece_2_of_body_3.part)

    # Cut-Extrude2: cut by cut_extrude2_tool
    add(cut_extrude2_tool.part, mode=Mode.SUBTRACT)


with BuildPart() as cut_extrude3_tool:
    # Sketch23 → Cut-Extrude3 (new body)
    with BuildSketch(Plane(origin=(28.75, 0, 0), x_dir=(0, 0, -1), z_dir=(1, 0, 0))):
        with Locations((10, 0)):
            Rectangle(SKETCH23_W, SKETCH23_H)
    extrude(amount=-CUT_EXTRUDE3_DEPTH)


with BuildPart() as cut_extrude1_piece_1_1:
    add(cut_extrude1_piece_1.part)

    # Cut-Extrude3: cut by cut_extrude3_tool
    add(cut_extrude3_tool.part, mode=Mode.SUBTRACT)


with BuildPart() as cut_extrude1_piece_2_1:
    add(cut_extrude1_piece_2.part)

    # Cut-Extrude3: cut by cut_extrude3_tool
    add(cut_extrude3_tool.part, mode=Mode.SUBTRACT)


solid = part_5.part
